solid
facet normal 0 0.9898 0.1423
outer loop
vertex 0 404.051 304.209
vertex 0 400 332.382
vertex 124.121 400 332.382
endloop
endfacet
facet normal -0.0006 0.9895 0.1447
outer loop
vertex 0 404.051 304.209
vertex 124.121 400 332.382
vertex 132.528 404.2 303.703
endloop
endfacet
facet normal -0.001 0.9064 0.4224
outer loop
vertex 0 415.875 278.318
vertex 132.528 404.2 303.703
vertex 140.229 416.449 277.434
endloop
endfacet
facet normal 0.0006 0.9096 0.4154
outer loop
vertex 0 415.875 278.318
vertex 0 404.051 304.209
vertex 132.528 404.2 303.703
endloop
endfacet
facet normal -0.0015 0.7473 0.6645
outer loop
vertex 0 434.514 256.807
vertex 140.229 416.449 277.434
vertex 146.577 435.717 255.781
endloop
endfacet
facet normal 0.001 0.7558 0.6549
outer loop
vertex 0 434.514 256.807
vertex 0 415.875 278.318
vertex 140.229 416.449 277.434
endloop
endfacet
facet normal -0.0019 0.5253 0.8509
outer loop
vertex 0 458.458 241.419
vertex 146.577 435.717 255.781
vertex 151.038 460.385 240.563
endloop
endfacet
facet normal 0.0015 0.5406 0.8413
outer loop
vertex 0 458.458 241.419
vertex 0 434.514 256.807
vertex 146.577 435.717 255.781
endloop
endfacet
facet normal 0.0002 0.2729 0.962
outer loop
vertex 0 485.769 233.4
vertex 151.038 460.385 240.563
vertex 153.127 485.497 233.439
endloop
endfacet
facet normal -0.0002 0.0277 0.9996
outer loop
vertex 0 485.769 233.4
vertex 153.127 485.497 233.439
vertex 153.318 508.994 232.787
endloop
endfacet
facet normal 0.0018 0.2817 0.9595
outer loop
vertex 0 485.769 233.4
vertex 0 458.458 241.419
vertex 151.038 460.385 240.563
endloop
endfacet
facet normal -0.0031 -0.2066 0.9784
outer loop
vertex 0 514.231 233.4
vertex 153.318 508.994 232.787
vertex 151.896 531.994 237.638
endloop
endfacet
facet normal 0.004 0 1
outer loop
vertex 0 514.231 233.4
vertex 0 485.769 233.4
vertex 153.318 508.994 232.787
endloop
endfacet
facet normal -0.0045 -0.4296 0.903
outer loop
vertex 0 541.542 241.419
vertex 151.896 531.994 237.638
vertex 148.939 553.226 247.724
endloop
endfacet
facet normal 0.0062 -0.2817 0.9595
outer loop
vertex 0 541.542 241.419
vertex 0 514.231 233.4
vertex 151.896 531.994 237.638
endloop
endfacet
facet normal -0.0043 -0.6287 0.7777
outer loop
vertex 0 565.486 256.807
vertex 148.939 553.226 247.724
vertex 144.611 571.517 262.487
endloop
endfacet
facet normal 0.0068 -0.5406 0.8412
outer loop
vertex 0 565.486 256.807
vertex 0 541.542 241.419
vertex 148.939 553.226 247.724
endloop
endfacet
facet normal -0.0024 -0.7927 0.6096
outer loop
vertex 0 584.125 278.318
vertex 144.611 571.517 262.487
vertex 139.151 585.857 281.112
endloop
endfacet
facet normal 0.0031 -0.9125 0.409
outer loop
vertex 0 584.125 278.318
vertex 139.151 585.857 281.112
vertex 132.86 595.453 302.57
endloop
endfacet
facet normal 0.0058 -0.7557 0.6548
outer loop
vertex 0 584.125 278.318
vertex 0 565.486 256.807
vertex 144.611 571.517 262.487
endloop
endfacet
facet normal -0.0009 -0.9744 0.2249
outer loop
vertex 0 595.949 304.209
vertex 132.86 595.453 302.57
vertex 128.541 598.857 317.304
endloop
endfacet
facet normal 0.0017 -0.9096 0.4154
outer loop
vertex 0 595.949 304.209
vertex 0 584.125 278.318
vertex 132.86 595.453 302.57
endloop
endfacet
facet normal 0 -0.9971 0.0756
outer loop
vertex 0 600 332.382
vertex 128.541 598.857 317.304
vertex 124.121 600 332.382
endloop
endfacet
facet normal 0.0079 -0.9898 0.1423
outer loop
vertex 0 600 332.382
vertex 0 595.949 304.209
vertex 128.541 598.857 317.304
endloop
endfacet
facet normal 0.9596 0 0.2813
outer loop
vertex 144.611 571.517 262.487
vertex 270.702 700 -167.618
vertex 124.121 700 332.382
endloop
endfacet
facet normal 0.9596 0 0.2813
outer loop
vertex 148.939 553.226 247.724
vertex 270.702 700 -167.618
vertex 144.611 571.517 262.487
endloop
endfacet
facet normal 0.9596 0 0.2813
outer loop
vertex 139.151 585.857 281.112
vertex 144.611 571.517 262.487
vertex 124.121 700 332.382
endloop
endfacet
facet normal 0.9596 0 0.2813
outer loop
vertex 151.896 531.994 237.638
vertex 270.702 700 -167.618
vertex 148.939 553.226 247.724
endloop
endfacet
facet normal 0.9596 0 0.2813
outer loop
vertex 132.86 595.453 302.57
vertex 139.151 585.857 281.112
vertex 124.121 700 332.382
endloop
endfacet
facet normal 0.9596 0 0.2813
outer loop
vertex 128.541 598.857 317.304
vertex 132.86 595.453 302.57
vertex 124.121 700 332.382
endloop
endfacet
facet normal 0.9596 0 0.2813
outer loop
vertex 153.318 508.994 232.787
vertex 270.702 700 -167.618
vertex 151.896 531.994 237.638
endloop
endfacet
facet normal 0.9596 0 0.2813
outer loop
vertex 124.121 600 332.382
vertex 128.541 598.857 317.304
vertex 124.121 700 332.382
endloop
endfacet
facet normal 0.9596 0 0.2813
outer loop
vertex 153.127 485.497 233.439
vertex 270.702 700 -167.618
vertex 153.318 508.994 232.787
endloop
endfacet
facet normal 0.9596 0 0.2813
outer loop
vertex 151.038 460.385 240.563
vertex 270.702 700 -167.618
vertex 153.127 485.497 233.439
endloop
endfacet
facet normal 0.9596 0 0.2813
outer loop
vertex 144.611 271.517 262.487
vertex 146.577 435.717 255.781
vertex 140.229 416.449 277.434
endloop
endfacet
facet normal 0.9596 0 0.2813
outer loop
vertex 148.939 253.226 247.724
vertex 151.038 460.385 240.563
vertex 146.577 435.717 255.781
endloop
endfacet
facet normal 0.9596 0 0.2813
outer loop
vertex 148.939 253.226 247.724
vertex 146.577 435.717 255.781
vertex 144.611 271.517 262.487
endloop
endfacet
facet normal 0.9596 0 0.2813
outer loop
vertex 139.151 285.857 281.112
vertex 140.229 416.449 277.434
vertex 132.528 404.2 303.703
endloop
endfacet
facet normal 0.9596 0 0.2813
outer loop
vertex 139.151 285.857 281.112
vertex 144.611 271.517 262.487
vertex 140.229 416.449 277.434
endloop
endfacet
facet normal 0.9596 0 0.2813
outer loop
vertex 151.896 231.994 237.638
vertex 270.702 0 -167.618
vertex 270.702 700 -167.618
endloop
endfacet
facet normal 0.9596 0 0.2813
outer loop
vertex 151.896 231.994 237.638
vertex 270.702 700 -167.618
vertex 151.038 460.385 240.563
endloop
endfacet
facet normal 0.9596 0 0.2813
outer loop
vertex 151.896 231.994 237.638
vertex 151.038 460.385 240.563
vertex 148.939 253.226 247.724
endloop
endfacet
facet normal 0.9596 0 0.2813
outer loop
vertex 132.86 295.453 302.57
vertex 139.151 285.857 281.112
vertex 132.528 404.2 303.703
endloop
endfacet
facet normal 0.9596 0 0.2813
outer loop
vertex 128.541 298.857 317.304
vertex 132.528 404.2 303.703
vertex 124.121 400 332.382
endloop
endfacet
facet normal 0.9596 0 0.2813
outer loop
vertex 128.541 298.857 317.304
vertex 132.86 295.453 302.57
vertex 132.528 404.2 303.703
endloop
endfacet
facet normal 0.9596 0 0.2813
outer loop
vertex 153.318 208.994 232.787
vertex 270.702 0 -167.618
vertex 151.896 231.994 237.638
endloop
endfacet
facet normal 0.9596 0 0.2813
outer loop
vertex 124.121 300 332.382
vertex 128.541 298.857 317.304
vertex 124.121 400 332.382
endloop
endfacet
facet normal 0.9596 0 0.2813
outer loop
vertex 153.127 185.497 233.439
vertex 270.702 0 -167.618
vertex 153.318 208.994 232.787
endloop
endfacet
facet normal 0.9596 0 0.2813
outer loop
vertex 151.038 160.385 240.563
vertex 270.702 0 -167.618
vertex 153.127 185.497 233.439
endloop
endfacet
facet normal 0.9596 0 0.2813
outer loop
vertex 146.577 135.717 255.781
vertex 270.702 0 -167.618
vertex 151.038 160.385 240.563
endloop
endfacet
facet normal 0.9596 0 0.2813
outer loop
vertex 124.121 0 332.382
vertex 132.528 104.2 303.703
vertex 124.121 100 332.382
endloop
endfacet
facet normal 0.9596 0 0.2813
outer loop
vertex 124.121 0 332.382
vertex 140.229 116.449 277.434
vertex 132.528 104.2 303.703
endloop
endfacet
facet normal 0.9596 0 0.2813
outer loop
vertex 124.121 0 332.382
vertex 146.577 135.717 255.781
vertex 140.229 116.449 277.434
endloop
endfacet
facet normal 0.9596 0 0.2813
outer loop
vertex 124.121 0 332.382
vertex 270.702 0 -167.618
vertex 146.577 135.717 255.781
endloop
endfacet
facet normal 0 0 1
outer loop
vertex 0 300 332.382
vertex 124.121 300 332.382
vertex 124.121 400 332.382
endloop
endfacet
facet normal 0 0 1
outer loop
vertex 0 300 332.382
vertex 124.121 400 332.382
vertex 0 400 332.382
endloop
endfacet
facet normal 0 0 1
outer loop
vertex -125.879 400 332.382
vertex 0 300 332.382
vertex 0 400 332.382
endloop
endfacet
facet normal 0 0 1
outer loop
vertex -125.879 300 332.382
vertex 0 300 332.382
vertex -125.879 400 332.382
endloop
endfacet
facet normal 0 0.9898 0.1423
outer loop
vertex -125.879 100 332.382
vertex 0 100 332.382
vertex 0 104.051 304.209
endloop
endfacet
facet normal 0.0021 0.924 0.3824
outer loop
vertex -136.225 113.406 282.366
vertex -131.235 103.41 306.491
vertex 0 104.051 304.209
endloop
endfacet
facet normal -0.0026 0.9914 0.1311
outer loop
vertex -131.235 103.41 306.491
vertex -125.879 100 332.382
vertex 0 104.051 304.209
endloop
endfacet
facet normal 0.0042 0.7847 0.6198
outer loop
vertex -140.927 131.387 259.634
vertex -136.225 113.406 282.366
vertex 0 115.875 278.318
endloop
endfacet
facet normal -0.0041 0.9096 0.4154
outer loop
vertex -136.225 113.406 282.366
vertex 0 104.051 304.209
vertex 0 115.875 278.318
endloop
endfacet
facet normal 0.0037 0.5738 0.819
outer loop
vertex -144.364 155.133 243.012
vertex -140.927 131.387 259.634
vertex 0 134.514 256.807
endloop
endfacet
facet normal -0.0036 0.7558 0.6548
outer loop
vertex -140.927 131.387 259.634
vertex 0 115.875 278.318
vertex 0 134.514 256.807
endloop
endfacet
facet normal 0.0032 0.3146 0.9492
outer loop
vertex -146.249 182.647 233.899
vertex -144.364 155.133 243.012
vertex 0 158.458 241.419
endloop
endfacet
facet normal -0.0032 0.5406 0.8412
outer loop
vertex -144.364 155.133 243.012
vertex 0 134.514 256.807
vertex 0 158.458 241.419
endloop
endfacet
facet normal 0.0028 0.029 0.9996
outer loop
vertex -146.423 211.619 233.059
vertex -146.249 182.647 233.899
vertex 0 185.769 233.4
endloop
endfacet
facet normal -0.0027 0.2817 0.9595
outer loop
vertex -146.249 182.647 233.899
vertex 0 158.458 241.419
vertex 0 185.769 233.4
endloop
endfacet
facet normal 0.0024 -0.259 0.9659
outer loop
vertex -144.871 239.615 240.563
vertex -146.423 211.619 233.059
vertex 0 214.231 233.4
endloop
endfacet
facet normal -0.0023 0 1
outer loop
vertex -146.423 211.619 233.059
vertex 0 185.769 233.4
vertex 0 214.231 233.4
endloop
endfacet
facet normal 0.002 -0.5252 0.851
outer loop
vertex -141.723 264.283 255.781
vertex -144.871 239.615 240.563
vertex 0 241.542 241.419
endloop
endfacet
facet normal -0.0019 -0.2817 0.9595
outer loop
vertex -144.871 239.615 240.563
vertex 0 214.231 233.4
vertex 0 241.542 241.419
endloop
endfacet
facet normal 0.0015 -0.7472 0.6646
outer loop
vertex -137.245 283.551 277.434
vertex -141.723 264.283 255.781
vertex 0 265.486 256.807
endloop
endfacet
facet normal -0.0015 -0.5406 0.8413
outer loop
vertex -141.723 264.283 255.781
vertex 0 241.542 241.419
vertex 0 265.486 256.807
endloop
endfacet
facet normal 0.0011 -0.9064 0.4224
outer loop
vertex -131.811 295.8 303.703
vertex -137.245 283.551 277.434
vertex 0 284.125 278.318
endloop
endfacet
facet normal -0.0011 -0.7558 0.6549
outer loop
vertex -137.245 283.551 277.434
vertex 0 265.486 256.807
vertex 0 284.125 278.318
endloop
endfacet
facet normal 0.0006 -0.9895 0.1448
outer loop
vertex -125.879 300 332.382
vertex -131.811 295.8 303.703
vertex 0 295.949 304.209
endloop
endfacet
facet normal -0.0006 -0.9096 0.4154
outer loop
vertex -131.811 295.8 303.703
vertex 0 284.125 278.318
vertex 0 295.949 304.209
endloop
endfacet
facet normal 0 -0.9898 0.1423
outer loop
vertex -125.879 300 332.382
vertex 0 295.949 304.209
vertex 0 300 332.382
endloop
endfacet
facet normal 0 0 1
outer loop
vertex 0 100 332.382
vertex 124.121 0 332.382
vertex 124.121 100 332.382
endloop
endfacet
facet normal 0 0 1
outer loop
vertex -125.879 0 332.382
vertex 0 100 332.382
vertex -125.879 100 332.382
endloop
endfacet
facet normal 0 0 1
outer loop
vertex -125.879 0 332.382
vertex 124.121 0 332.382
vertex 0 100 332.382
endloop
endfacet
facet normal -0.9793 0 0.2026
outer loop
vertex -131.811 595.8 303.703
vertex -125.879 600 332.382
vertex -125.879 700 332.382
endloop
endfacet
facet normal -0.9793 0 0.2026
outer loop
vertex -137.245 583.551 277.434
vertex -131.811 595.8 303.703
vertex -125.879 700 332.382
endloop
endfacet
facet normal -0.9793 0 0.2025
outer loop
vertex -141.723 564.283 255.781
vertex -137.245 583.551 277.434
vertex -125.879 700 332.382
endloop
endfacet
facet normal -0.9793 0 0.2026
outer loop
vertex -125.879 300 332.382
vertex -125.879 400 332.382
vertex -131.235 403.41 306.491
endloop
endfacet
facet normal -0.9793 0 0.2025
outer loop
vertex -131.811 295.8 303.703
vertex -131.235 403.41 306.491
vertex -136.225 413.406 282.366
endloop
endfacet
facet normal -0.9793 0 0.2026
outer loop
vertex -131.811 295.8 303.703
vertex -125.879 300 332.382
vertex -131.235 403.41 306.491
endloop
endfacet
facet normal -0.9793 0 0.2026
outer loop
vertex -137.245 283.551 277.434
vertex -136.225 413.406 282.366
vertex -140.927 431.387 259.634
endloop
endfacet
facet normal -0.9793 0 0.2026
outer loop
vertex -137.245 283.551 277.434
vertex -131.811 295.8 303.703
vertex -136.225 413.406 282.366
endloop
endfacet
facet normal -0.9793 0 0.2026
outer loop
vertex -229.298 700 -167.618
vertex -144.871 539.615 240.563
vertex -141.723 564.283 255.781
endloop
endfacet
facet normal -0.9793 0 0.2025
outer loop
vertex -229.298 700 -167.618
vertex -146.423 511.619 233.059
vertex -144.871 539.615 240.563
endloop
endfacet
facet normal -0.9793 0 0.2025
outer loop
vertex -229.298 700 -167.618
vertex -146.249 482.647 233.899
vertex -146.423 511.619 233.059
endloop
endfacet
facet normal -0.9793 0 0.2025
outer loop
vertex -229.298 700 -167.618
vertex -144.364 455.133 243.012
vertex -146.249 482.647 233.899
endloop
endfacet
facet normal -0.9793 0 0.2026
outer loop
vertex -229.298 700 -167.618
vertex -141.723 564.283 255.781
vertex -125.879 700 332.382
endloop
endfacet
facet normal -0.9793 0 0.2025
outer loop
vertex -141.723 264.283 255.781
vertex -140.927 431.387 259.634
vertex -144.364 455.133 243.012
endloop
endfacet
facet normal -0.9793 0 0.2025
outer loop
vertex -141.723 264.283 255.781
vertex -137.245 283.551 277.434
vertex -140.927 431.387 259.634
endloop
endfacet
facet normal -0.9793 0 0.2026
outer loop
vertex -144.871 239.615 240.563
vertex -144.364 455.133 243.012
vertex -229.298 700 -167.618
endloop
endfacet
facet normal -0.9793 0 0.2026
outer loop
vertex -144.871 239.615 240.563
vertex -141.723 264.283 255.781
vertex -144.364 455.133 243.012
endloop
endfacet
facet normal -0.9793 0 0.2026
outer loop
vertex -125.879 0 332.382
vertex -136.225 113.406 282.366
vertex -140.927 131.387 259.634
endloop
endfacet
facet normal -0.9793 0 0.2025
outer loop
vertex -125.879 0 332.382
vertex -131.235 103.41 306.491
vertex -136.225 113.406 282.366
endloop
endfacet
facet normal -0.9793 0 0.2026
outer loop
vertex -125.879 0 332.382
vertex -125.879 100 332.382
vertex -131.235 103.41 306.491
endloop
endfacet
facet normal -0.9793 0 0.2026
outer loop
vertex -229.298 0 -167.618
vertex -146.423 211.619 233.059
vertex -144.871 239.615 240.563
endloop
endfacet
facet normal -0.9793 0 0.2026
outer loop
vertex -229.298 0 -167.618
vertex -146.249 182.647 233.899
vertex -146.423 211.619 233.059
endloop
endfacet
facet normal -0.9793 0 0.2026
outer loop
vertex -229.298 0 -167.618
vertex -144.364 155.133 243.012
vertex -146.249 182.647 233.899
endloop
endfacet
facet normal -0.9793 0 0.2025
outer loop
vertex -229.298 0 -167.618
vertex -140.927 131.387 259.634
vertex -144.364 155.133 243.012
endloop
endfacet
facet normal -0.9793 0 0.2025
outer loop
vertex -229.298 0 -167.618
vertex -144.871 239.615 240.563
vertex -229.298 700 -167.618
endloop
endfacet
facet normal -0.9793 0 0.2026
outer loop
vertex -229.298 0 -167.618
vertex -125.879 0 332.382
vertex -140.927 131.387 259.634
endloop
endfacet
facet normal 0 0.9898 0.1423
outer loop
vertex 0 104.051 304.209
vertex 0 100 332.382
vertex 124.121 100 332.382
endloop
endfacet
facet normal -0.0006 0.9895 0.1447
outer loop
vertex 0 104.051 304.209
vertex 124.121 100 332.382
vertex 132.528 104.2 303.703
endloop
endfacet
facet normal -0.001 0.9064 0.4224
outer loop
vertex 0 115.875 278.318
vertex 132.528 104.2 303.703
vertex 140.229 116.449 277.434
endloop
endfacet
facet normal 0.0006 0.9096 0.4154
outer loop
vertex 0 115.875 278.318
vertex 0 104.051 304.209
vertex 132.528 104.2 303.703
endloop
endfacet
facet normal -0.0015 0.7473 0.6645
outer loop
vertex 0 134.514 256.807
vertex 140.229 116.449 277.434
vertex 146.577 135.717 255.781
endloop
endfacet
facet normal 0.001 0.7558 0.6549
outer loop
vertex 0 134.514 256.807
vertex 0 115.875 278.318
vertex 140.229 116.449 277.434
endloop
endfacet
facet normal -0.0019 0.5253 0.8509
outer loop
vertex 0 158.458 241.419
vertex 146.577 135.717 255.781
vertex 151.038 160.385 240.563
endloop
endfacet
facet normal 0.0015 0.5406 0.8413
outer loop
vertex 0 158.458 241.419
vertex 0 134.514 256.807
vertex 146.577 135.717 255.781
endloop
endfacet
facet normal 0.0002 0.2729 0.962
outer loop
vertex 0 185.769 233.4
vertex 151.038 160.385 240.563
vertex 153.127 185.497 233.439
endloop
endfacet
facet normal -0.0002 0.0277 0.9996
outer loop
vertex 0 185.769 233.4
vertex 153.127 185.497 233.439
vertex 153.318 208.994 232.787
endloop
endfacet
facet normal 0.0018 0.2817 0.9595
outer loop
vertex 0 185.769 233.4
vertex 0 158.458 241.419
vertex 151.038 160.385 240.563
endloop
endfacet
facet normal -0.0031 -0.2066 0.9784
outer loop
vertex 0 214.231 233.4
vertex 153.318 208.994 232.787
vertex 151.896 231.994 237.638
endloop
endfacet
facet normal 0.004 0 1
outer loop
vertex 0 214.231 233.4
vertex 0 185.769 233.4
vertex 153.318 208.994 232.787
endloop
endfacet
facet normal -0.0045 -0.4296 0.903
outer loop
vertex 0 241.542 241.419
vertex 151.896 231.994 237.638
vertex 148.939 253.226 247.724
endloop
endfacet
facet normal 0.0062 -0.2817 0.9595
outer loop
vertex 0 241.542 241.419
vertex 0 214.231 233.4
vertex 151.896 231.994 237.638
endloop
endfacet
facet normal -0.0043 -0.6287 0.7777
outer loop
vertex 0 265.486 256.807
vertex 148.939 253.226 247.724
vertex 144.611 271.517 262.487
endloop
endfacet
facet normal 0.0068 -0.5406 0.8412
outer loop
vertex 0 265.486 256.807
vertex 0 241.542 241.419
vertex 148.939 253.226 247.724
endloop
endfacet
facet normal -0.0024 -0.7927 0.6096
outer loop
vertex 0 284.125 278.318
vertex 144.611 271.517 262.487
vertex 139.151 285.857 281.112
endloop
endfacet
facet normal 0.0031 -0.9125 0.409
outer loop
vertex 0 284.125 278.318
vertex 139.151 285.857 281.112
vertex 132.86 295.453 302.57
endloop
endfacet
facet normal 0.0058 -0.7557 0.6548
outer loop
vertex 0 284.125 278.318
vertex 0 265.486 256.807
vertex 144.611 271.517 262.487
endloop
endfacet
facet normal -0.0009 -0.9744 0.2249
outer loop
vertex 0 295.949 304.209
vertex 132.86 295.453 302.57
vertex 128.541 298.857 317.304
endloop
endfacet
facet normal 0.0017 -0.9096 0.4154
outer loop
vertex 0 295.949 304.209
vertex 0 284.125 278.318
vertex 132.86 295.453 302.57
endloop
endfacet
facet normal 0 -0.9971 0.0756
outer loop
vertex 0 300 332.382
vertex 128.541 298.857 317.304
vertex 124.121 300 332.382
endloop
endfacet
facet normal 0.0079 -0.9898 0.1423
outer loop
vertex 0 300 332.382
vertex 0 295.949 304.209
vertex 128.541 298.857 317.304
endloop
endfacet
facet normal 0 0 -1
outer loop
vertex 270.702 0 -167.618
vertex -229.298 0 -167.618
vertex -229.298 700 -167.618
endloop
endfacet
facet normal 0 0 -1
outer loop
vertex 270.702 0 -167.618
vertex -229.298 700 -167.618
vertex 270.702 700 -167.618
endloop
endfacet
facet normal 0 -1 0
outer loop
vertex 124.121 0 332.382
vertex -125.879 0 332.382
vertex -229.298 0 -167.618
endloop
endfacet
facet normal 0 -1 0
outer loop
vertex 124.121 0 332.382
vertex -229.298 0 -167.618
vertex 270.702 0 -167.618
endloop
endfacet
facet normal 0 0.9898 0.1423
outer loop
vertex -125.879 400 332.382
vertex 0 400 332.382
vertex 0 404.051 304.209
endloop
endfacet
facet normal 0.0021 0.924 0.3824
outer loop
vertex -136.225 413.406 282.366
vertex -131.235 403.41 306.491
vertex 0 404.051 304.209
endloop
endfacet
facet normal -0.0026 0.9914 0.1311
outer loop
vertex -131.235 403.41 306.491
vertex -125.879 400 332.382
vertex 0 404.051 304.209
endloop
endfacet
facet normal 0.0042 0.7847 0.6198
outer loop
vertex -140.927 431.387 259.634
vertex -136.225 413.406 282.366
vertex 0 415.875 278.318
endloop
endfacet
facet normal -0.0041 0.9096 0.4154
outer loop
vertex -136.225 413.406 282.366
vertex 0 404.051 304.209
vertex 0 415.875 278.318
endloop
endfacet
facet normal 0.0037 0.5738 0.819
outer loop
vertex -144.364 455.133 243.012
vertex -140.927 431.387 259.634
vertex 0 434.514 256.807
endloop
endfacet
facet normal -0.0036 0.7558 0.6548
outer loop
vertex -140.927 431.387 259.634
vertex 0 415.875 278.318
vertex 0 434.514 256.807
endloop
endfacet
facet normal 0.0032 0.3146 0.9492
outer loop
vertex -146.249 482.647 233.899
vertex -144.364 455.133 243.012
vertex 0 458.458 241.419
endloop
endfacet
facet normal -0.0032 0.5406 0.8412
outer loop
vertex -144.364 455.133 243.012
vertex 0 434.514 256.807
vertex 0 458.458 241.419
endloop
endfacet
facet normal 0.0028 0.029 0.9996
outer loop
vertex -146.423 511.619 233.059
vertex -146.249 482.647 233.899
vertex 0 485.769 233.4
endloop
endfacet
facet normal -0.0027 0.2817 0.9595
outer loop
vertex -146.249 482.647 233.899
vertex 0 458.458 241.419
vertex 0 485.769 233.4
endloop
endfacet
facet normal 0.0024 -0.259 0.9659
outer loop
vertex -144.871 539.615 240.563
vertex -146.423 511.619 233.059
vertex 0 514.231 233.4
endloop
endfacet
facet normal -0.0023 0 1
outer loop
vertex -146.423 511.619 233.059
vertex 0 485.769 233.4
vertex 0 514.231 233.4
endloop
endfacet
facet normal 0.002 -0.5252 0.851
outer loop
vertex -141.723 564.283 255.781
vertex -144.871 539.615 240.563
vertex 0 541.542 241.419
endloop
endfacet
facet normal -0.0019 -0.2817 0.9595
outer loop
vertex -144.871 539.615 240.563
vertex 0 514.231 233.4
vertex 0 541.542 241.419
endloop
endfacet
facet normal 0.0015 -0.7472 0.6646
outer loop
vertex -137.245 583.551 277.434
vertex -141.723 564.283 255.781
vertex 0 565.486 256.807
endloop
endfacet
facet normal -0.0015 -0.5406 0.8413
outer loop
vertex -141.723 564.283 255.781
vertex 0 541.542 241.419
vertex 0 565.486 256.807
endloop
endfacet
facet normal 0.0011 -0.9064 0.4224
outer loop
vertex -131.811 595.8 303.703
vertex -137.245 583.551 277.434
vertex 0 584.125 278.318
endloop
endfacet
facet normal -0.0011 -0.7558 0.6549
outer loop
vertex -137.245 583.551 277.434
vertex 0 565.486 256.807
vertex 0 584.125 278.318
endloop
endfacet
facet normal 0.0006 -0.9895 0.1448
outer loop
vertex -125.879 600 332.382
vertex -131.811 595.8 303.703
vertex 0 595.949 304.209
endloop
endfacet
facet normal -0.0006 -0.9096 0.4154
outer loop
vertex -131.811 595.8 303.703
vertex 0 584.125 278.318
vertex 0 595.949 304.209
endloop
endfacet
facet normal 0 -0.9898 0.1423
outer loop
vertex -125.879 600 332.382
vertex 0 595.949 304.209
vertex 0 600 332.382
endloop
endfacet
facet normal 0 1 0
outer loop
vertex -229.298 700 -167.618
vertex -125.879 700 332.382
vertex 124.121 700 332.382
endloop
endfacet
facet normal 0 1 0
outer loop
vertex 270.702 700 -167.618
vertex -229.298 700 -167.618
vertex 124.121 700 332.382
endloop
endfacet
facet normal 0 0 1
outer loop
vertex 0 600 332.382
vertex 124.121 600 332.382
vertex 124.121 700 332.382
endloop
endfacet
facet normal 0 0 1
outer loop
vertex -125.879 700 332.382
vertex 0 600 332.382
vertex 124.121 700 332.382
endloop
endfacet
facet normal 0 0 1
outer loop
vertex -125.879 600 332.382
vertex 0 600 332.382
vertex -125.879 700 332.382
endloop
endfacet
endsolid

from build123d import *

# Parameters (mm, degrees)
F1_DEPTH      = 700
F2_R          = 100
F3_DEPTH      = 400
F3_DEPTH_BACK = 310


with BuildPart() as f1:
    # F0 (on Front) → F1 (new body)
    with BuildSketch(Plane.XZ):
        Polygon((270.7016063785, -167.6180982615), (124.1205126206, 332.3819017385), (-125.8794873794, 332.3819017385), (-229.2983936215, -167.6180982615), align=None)
    extrude(amount=-F1_DEPTH)

    # F2 (on Right) → F3 (cut, two sides)
    with BuildSketch(Plane.YZ) as f3_sk:
        with Locations((200, 332.3819017385)):
            Circle(F2_R)
        with Locations((500, 332.3819017385)):
            Circle(F2_R)
    extrude(amount=-F3_DEPTH, mode=Mode.SUBTRACT)
    extrude(f3_sk.sketch, amount=F3_DEPTH_BACK, mode=Mode.SUBTRACT)


solid = f1.part
